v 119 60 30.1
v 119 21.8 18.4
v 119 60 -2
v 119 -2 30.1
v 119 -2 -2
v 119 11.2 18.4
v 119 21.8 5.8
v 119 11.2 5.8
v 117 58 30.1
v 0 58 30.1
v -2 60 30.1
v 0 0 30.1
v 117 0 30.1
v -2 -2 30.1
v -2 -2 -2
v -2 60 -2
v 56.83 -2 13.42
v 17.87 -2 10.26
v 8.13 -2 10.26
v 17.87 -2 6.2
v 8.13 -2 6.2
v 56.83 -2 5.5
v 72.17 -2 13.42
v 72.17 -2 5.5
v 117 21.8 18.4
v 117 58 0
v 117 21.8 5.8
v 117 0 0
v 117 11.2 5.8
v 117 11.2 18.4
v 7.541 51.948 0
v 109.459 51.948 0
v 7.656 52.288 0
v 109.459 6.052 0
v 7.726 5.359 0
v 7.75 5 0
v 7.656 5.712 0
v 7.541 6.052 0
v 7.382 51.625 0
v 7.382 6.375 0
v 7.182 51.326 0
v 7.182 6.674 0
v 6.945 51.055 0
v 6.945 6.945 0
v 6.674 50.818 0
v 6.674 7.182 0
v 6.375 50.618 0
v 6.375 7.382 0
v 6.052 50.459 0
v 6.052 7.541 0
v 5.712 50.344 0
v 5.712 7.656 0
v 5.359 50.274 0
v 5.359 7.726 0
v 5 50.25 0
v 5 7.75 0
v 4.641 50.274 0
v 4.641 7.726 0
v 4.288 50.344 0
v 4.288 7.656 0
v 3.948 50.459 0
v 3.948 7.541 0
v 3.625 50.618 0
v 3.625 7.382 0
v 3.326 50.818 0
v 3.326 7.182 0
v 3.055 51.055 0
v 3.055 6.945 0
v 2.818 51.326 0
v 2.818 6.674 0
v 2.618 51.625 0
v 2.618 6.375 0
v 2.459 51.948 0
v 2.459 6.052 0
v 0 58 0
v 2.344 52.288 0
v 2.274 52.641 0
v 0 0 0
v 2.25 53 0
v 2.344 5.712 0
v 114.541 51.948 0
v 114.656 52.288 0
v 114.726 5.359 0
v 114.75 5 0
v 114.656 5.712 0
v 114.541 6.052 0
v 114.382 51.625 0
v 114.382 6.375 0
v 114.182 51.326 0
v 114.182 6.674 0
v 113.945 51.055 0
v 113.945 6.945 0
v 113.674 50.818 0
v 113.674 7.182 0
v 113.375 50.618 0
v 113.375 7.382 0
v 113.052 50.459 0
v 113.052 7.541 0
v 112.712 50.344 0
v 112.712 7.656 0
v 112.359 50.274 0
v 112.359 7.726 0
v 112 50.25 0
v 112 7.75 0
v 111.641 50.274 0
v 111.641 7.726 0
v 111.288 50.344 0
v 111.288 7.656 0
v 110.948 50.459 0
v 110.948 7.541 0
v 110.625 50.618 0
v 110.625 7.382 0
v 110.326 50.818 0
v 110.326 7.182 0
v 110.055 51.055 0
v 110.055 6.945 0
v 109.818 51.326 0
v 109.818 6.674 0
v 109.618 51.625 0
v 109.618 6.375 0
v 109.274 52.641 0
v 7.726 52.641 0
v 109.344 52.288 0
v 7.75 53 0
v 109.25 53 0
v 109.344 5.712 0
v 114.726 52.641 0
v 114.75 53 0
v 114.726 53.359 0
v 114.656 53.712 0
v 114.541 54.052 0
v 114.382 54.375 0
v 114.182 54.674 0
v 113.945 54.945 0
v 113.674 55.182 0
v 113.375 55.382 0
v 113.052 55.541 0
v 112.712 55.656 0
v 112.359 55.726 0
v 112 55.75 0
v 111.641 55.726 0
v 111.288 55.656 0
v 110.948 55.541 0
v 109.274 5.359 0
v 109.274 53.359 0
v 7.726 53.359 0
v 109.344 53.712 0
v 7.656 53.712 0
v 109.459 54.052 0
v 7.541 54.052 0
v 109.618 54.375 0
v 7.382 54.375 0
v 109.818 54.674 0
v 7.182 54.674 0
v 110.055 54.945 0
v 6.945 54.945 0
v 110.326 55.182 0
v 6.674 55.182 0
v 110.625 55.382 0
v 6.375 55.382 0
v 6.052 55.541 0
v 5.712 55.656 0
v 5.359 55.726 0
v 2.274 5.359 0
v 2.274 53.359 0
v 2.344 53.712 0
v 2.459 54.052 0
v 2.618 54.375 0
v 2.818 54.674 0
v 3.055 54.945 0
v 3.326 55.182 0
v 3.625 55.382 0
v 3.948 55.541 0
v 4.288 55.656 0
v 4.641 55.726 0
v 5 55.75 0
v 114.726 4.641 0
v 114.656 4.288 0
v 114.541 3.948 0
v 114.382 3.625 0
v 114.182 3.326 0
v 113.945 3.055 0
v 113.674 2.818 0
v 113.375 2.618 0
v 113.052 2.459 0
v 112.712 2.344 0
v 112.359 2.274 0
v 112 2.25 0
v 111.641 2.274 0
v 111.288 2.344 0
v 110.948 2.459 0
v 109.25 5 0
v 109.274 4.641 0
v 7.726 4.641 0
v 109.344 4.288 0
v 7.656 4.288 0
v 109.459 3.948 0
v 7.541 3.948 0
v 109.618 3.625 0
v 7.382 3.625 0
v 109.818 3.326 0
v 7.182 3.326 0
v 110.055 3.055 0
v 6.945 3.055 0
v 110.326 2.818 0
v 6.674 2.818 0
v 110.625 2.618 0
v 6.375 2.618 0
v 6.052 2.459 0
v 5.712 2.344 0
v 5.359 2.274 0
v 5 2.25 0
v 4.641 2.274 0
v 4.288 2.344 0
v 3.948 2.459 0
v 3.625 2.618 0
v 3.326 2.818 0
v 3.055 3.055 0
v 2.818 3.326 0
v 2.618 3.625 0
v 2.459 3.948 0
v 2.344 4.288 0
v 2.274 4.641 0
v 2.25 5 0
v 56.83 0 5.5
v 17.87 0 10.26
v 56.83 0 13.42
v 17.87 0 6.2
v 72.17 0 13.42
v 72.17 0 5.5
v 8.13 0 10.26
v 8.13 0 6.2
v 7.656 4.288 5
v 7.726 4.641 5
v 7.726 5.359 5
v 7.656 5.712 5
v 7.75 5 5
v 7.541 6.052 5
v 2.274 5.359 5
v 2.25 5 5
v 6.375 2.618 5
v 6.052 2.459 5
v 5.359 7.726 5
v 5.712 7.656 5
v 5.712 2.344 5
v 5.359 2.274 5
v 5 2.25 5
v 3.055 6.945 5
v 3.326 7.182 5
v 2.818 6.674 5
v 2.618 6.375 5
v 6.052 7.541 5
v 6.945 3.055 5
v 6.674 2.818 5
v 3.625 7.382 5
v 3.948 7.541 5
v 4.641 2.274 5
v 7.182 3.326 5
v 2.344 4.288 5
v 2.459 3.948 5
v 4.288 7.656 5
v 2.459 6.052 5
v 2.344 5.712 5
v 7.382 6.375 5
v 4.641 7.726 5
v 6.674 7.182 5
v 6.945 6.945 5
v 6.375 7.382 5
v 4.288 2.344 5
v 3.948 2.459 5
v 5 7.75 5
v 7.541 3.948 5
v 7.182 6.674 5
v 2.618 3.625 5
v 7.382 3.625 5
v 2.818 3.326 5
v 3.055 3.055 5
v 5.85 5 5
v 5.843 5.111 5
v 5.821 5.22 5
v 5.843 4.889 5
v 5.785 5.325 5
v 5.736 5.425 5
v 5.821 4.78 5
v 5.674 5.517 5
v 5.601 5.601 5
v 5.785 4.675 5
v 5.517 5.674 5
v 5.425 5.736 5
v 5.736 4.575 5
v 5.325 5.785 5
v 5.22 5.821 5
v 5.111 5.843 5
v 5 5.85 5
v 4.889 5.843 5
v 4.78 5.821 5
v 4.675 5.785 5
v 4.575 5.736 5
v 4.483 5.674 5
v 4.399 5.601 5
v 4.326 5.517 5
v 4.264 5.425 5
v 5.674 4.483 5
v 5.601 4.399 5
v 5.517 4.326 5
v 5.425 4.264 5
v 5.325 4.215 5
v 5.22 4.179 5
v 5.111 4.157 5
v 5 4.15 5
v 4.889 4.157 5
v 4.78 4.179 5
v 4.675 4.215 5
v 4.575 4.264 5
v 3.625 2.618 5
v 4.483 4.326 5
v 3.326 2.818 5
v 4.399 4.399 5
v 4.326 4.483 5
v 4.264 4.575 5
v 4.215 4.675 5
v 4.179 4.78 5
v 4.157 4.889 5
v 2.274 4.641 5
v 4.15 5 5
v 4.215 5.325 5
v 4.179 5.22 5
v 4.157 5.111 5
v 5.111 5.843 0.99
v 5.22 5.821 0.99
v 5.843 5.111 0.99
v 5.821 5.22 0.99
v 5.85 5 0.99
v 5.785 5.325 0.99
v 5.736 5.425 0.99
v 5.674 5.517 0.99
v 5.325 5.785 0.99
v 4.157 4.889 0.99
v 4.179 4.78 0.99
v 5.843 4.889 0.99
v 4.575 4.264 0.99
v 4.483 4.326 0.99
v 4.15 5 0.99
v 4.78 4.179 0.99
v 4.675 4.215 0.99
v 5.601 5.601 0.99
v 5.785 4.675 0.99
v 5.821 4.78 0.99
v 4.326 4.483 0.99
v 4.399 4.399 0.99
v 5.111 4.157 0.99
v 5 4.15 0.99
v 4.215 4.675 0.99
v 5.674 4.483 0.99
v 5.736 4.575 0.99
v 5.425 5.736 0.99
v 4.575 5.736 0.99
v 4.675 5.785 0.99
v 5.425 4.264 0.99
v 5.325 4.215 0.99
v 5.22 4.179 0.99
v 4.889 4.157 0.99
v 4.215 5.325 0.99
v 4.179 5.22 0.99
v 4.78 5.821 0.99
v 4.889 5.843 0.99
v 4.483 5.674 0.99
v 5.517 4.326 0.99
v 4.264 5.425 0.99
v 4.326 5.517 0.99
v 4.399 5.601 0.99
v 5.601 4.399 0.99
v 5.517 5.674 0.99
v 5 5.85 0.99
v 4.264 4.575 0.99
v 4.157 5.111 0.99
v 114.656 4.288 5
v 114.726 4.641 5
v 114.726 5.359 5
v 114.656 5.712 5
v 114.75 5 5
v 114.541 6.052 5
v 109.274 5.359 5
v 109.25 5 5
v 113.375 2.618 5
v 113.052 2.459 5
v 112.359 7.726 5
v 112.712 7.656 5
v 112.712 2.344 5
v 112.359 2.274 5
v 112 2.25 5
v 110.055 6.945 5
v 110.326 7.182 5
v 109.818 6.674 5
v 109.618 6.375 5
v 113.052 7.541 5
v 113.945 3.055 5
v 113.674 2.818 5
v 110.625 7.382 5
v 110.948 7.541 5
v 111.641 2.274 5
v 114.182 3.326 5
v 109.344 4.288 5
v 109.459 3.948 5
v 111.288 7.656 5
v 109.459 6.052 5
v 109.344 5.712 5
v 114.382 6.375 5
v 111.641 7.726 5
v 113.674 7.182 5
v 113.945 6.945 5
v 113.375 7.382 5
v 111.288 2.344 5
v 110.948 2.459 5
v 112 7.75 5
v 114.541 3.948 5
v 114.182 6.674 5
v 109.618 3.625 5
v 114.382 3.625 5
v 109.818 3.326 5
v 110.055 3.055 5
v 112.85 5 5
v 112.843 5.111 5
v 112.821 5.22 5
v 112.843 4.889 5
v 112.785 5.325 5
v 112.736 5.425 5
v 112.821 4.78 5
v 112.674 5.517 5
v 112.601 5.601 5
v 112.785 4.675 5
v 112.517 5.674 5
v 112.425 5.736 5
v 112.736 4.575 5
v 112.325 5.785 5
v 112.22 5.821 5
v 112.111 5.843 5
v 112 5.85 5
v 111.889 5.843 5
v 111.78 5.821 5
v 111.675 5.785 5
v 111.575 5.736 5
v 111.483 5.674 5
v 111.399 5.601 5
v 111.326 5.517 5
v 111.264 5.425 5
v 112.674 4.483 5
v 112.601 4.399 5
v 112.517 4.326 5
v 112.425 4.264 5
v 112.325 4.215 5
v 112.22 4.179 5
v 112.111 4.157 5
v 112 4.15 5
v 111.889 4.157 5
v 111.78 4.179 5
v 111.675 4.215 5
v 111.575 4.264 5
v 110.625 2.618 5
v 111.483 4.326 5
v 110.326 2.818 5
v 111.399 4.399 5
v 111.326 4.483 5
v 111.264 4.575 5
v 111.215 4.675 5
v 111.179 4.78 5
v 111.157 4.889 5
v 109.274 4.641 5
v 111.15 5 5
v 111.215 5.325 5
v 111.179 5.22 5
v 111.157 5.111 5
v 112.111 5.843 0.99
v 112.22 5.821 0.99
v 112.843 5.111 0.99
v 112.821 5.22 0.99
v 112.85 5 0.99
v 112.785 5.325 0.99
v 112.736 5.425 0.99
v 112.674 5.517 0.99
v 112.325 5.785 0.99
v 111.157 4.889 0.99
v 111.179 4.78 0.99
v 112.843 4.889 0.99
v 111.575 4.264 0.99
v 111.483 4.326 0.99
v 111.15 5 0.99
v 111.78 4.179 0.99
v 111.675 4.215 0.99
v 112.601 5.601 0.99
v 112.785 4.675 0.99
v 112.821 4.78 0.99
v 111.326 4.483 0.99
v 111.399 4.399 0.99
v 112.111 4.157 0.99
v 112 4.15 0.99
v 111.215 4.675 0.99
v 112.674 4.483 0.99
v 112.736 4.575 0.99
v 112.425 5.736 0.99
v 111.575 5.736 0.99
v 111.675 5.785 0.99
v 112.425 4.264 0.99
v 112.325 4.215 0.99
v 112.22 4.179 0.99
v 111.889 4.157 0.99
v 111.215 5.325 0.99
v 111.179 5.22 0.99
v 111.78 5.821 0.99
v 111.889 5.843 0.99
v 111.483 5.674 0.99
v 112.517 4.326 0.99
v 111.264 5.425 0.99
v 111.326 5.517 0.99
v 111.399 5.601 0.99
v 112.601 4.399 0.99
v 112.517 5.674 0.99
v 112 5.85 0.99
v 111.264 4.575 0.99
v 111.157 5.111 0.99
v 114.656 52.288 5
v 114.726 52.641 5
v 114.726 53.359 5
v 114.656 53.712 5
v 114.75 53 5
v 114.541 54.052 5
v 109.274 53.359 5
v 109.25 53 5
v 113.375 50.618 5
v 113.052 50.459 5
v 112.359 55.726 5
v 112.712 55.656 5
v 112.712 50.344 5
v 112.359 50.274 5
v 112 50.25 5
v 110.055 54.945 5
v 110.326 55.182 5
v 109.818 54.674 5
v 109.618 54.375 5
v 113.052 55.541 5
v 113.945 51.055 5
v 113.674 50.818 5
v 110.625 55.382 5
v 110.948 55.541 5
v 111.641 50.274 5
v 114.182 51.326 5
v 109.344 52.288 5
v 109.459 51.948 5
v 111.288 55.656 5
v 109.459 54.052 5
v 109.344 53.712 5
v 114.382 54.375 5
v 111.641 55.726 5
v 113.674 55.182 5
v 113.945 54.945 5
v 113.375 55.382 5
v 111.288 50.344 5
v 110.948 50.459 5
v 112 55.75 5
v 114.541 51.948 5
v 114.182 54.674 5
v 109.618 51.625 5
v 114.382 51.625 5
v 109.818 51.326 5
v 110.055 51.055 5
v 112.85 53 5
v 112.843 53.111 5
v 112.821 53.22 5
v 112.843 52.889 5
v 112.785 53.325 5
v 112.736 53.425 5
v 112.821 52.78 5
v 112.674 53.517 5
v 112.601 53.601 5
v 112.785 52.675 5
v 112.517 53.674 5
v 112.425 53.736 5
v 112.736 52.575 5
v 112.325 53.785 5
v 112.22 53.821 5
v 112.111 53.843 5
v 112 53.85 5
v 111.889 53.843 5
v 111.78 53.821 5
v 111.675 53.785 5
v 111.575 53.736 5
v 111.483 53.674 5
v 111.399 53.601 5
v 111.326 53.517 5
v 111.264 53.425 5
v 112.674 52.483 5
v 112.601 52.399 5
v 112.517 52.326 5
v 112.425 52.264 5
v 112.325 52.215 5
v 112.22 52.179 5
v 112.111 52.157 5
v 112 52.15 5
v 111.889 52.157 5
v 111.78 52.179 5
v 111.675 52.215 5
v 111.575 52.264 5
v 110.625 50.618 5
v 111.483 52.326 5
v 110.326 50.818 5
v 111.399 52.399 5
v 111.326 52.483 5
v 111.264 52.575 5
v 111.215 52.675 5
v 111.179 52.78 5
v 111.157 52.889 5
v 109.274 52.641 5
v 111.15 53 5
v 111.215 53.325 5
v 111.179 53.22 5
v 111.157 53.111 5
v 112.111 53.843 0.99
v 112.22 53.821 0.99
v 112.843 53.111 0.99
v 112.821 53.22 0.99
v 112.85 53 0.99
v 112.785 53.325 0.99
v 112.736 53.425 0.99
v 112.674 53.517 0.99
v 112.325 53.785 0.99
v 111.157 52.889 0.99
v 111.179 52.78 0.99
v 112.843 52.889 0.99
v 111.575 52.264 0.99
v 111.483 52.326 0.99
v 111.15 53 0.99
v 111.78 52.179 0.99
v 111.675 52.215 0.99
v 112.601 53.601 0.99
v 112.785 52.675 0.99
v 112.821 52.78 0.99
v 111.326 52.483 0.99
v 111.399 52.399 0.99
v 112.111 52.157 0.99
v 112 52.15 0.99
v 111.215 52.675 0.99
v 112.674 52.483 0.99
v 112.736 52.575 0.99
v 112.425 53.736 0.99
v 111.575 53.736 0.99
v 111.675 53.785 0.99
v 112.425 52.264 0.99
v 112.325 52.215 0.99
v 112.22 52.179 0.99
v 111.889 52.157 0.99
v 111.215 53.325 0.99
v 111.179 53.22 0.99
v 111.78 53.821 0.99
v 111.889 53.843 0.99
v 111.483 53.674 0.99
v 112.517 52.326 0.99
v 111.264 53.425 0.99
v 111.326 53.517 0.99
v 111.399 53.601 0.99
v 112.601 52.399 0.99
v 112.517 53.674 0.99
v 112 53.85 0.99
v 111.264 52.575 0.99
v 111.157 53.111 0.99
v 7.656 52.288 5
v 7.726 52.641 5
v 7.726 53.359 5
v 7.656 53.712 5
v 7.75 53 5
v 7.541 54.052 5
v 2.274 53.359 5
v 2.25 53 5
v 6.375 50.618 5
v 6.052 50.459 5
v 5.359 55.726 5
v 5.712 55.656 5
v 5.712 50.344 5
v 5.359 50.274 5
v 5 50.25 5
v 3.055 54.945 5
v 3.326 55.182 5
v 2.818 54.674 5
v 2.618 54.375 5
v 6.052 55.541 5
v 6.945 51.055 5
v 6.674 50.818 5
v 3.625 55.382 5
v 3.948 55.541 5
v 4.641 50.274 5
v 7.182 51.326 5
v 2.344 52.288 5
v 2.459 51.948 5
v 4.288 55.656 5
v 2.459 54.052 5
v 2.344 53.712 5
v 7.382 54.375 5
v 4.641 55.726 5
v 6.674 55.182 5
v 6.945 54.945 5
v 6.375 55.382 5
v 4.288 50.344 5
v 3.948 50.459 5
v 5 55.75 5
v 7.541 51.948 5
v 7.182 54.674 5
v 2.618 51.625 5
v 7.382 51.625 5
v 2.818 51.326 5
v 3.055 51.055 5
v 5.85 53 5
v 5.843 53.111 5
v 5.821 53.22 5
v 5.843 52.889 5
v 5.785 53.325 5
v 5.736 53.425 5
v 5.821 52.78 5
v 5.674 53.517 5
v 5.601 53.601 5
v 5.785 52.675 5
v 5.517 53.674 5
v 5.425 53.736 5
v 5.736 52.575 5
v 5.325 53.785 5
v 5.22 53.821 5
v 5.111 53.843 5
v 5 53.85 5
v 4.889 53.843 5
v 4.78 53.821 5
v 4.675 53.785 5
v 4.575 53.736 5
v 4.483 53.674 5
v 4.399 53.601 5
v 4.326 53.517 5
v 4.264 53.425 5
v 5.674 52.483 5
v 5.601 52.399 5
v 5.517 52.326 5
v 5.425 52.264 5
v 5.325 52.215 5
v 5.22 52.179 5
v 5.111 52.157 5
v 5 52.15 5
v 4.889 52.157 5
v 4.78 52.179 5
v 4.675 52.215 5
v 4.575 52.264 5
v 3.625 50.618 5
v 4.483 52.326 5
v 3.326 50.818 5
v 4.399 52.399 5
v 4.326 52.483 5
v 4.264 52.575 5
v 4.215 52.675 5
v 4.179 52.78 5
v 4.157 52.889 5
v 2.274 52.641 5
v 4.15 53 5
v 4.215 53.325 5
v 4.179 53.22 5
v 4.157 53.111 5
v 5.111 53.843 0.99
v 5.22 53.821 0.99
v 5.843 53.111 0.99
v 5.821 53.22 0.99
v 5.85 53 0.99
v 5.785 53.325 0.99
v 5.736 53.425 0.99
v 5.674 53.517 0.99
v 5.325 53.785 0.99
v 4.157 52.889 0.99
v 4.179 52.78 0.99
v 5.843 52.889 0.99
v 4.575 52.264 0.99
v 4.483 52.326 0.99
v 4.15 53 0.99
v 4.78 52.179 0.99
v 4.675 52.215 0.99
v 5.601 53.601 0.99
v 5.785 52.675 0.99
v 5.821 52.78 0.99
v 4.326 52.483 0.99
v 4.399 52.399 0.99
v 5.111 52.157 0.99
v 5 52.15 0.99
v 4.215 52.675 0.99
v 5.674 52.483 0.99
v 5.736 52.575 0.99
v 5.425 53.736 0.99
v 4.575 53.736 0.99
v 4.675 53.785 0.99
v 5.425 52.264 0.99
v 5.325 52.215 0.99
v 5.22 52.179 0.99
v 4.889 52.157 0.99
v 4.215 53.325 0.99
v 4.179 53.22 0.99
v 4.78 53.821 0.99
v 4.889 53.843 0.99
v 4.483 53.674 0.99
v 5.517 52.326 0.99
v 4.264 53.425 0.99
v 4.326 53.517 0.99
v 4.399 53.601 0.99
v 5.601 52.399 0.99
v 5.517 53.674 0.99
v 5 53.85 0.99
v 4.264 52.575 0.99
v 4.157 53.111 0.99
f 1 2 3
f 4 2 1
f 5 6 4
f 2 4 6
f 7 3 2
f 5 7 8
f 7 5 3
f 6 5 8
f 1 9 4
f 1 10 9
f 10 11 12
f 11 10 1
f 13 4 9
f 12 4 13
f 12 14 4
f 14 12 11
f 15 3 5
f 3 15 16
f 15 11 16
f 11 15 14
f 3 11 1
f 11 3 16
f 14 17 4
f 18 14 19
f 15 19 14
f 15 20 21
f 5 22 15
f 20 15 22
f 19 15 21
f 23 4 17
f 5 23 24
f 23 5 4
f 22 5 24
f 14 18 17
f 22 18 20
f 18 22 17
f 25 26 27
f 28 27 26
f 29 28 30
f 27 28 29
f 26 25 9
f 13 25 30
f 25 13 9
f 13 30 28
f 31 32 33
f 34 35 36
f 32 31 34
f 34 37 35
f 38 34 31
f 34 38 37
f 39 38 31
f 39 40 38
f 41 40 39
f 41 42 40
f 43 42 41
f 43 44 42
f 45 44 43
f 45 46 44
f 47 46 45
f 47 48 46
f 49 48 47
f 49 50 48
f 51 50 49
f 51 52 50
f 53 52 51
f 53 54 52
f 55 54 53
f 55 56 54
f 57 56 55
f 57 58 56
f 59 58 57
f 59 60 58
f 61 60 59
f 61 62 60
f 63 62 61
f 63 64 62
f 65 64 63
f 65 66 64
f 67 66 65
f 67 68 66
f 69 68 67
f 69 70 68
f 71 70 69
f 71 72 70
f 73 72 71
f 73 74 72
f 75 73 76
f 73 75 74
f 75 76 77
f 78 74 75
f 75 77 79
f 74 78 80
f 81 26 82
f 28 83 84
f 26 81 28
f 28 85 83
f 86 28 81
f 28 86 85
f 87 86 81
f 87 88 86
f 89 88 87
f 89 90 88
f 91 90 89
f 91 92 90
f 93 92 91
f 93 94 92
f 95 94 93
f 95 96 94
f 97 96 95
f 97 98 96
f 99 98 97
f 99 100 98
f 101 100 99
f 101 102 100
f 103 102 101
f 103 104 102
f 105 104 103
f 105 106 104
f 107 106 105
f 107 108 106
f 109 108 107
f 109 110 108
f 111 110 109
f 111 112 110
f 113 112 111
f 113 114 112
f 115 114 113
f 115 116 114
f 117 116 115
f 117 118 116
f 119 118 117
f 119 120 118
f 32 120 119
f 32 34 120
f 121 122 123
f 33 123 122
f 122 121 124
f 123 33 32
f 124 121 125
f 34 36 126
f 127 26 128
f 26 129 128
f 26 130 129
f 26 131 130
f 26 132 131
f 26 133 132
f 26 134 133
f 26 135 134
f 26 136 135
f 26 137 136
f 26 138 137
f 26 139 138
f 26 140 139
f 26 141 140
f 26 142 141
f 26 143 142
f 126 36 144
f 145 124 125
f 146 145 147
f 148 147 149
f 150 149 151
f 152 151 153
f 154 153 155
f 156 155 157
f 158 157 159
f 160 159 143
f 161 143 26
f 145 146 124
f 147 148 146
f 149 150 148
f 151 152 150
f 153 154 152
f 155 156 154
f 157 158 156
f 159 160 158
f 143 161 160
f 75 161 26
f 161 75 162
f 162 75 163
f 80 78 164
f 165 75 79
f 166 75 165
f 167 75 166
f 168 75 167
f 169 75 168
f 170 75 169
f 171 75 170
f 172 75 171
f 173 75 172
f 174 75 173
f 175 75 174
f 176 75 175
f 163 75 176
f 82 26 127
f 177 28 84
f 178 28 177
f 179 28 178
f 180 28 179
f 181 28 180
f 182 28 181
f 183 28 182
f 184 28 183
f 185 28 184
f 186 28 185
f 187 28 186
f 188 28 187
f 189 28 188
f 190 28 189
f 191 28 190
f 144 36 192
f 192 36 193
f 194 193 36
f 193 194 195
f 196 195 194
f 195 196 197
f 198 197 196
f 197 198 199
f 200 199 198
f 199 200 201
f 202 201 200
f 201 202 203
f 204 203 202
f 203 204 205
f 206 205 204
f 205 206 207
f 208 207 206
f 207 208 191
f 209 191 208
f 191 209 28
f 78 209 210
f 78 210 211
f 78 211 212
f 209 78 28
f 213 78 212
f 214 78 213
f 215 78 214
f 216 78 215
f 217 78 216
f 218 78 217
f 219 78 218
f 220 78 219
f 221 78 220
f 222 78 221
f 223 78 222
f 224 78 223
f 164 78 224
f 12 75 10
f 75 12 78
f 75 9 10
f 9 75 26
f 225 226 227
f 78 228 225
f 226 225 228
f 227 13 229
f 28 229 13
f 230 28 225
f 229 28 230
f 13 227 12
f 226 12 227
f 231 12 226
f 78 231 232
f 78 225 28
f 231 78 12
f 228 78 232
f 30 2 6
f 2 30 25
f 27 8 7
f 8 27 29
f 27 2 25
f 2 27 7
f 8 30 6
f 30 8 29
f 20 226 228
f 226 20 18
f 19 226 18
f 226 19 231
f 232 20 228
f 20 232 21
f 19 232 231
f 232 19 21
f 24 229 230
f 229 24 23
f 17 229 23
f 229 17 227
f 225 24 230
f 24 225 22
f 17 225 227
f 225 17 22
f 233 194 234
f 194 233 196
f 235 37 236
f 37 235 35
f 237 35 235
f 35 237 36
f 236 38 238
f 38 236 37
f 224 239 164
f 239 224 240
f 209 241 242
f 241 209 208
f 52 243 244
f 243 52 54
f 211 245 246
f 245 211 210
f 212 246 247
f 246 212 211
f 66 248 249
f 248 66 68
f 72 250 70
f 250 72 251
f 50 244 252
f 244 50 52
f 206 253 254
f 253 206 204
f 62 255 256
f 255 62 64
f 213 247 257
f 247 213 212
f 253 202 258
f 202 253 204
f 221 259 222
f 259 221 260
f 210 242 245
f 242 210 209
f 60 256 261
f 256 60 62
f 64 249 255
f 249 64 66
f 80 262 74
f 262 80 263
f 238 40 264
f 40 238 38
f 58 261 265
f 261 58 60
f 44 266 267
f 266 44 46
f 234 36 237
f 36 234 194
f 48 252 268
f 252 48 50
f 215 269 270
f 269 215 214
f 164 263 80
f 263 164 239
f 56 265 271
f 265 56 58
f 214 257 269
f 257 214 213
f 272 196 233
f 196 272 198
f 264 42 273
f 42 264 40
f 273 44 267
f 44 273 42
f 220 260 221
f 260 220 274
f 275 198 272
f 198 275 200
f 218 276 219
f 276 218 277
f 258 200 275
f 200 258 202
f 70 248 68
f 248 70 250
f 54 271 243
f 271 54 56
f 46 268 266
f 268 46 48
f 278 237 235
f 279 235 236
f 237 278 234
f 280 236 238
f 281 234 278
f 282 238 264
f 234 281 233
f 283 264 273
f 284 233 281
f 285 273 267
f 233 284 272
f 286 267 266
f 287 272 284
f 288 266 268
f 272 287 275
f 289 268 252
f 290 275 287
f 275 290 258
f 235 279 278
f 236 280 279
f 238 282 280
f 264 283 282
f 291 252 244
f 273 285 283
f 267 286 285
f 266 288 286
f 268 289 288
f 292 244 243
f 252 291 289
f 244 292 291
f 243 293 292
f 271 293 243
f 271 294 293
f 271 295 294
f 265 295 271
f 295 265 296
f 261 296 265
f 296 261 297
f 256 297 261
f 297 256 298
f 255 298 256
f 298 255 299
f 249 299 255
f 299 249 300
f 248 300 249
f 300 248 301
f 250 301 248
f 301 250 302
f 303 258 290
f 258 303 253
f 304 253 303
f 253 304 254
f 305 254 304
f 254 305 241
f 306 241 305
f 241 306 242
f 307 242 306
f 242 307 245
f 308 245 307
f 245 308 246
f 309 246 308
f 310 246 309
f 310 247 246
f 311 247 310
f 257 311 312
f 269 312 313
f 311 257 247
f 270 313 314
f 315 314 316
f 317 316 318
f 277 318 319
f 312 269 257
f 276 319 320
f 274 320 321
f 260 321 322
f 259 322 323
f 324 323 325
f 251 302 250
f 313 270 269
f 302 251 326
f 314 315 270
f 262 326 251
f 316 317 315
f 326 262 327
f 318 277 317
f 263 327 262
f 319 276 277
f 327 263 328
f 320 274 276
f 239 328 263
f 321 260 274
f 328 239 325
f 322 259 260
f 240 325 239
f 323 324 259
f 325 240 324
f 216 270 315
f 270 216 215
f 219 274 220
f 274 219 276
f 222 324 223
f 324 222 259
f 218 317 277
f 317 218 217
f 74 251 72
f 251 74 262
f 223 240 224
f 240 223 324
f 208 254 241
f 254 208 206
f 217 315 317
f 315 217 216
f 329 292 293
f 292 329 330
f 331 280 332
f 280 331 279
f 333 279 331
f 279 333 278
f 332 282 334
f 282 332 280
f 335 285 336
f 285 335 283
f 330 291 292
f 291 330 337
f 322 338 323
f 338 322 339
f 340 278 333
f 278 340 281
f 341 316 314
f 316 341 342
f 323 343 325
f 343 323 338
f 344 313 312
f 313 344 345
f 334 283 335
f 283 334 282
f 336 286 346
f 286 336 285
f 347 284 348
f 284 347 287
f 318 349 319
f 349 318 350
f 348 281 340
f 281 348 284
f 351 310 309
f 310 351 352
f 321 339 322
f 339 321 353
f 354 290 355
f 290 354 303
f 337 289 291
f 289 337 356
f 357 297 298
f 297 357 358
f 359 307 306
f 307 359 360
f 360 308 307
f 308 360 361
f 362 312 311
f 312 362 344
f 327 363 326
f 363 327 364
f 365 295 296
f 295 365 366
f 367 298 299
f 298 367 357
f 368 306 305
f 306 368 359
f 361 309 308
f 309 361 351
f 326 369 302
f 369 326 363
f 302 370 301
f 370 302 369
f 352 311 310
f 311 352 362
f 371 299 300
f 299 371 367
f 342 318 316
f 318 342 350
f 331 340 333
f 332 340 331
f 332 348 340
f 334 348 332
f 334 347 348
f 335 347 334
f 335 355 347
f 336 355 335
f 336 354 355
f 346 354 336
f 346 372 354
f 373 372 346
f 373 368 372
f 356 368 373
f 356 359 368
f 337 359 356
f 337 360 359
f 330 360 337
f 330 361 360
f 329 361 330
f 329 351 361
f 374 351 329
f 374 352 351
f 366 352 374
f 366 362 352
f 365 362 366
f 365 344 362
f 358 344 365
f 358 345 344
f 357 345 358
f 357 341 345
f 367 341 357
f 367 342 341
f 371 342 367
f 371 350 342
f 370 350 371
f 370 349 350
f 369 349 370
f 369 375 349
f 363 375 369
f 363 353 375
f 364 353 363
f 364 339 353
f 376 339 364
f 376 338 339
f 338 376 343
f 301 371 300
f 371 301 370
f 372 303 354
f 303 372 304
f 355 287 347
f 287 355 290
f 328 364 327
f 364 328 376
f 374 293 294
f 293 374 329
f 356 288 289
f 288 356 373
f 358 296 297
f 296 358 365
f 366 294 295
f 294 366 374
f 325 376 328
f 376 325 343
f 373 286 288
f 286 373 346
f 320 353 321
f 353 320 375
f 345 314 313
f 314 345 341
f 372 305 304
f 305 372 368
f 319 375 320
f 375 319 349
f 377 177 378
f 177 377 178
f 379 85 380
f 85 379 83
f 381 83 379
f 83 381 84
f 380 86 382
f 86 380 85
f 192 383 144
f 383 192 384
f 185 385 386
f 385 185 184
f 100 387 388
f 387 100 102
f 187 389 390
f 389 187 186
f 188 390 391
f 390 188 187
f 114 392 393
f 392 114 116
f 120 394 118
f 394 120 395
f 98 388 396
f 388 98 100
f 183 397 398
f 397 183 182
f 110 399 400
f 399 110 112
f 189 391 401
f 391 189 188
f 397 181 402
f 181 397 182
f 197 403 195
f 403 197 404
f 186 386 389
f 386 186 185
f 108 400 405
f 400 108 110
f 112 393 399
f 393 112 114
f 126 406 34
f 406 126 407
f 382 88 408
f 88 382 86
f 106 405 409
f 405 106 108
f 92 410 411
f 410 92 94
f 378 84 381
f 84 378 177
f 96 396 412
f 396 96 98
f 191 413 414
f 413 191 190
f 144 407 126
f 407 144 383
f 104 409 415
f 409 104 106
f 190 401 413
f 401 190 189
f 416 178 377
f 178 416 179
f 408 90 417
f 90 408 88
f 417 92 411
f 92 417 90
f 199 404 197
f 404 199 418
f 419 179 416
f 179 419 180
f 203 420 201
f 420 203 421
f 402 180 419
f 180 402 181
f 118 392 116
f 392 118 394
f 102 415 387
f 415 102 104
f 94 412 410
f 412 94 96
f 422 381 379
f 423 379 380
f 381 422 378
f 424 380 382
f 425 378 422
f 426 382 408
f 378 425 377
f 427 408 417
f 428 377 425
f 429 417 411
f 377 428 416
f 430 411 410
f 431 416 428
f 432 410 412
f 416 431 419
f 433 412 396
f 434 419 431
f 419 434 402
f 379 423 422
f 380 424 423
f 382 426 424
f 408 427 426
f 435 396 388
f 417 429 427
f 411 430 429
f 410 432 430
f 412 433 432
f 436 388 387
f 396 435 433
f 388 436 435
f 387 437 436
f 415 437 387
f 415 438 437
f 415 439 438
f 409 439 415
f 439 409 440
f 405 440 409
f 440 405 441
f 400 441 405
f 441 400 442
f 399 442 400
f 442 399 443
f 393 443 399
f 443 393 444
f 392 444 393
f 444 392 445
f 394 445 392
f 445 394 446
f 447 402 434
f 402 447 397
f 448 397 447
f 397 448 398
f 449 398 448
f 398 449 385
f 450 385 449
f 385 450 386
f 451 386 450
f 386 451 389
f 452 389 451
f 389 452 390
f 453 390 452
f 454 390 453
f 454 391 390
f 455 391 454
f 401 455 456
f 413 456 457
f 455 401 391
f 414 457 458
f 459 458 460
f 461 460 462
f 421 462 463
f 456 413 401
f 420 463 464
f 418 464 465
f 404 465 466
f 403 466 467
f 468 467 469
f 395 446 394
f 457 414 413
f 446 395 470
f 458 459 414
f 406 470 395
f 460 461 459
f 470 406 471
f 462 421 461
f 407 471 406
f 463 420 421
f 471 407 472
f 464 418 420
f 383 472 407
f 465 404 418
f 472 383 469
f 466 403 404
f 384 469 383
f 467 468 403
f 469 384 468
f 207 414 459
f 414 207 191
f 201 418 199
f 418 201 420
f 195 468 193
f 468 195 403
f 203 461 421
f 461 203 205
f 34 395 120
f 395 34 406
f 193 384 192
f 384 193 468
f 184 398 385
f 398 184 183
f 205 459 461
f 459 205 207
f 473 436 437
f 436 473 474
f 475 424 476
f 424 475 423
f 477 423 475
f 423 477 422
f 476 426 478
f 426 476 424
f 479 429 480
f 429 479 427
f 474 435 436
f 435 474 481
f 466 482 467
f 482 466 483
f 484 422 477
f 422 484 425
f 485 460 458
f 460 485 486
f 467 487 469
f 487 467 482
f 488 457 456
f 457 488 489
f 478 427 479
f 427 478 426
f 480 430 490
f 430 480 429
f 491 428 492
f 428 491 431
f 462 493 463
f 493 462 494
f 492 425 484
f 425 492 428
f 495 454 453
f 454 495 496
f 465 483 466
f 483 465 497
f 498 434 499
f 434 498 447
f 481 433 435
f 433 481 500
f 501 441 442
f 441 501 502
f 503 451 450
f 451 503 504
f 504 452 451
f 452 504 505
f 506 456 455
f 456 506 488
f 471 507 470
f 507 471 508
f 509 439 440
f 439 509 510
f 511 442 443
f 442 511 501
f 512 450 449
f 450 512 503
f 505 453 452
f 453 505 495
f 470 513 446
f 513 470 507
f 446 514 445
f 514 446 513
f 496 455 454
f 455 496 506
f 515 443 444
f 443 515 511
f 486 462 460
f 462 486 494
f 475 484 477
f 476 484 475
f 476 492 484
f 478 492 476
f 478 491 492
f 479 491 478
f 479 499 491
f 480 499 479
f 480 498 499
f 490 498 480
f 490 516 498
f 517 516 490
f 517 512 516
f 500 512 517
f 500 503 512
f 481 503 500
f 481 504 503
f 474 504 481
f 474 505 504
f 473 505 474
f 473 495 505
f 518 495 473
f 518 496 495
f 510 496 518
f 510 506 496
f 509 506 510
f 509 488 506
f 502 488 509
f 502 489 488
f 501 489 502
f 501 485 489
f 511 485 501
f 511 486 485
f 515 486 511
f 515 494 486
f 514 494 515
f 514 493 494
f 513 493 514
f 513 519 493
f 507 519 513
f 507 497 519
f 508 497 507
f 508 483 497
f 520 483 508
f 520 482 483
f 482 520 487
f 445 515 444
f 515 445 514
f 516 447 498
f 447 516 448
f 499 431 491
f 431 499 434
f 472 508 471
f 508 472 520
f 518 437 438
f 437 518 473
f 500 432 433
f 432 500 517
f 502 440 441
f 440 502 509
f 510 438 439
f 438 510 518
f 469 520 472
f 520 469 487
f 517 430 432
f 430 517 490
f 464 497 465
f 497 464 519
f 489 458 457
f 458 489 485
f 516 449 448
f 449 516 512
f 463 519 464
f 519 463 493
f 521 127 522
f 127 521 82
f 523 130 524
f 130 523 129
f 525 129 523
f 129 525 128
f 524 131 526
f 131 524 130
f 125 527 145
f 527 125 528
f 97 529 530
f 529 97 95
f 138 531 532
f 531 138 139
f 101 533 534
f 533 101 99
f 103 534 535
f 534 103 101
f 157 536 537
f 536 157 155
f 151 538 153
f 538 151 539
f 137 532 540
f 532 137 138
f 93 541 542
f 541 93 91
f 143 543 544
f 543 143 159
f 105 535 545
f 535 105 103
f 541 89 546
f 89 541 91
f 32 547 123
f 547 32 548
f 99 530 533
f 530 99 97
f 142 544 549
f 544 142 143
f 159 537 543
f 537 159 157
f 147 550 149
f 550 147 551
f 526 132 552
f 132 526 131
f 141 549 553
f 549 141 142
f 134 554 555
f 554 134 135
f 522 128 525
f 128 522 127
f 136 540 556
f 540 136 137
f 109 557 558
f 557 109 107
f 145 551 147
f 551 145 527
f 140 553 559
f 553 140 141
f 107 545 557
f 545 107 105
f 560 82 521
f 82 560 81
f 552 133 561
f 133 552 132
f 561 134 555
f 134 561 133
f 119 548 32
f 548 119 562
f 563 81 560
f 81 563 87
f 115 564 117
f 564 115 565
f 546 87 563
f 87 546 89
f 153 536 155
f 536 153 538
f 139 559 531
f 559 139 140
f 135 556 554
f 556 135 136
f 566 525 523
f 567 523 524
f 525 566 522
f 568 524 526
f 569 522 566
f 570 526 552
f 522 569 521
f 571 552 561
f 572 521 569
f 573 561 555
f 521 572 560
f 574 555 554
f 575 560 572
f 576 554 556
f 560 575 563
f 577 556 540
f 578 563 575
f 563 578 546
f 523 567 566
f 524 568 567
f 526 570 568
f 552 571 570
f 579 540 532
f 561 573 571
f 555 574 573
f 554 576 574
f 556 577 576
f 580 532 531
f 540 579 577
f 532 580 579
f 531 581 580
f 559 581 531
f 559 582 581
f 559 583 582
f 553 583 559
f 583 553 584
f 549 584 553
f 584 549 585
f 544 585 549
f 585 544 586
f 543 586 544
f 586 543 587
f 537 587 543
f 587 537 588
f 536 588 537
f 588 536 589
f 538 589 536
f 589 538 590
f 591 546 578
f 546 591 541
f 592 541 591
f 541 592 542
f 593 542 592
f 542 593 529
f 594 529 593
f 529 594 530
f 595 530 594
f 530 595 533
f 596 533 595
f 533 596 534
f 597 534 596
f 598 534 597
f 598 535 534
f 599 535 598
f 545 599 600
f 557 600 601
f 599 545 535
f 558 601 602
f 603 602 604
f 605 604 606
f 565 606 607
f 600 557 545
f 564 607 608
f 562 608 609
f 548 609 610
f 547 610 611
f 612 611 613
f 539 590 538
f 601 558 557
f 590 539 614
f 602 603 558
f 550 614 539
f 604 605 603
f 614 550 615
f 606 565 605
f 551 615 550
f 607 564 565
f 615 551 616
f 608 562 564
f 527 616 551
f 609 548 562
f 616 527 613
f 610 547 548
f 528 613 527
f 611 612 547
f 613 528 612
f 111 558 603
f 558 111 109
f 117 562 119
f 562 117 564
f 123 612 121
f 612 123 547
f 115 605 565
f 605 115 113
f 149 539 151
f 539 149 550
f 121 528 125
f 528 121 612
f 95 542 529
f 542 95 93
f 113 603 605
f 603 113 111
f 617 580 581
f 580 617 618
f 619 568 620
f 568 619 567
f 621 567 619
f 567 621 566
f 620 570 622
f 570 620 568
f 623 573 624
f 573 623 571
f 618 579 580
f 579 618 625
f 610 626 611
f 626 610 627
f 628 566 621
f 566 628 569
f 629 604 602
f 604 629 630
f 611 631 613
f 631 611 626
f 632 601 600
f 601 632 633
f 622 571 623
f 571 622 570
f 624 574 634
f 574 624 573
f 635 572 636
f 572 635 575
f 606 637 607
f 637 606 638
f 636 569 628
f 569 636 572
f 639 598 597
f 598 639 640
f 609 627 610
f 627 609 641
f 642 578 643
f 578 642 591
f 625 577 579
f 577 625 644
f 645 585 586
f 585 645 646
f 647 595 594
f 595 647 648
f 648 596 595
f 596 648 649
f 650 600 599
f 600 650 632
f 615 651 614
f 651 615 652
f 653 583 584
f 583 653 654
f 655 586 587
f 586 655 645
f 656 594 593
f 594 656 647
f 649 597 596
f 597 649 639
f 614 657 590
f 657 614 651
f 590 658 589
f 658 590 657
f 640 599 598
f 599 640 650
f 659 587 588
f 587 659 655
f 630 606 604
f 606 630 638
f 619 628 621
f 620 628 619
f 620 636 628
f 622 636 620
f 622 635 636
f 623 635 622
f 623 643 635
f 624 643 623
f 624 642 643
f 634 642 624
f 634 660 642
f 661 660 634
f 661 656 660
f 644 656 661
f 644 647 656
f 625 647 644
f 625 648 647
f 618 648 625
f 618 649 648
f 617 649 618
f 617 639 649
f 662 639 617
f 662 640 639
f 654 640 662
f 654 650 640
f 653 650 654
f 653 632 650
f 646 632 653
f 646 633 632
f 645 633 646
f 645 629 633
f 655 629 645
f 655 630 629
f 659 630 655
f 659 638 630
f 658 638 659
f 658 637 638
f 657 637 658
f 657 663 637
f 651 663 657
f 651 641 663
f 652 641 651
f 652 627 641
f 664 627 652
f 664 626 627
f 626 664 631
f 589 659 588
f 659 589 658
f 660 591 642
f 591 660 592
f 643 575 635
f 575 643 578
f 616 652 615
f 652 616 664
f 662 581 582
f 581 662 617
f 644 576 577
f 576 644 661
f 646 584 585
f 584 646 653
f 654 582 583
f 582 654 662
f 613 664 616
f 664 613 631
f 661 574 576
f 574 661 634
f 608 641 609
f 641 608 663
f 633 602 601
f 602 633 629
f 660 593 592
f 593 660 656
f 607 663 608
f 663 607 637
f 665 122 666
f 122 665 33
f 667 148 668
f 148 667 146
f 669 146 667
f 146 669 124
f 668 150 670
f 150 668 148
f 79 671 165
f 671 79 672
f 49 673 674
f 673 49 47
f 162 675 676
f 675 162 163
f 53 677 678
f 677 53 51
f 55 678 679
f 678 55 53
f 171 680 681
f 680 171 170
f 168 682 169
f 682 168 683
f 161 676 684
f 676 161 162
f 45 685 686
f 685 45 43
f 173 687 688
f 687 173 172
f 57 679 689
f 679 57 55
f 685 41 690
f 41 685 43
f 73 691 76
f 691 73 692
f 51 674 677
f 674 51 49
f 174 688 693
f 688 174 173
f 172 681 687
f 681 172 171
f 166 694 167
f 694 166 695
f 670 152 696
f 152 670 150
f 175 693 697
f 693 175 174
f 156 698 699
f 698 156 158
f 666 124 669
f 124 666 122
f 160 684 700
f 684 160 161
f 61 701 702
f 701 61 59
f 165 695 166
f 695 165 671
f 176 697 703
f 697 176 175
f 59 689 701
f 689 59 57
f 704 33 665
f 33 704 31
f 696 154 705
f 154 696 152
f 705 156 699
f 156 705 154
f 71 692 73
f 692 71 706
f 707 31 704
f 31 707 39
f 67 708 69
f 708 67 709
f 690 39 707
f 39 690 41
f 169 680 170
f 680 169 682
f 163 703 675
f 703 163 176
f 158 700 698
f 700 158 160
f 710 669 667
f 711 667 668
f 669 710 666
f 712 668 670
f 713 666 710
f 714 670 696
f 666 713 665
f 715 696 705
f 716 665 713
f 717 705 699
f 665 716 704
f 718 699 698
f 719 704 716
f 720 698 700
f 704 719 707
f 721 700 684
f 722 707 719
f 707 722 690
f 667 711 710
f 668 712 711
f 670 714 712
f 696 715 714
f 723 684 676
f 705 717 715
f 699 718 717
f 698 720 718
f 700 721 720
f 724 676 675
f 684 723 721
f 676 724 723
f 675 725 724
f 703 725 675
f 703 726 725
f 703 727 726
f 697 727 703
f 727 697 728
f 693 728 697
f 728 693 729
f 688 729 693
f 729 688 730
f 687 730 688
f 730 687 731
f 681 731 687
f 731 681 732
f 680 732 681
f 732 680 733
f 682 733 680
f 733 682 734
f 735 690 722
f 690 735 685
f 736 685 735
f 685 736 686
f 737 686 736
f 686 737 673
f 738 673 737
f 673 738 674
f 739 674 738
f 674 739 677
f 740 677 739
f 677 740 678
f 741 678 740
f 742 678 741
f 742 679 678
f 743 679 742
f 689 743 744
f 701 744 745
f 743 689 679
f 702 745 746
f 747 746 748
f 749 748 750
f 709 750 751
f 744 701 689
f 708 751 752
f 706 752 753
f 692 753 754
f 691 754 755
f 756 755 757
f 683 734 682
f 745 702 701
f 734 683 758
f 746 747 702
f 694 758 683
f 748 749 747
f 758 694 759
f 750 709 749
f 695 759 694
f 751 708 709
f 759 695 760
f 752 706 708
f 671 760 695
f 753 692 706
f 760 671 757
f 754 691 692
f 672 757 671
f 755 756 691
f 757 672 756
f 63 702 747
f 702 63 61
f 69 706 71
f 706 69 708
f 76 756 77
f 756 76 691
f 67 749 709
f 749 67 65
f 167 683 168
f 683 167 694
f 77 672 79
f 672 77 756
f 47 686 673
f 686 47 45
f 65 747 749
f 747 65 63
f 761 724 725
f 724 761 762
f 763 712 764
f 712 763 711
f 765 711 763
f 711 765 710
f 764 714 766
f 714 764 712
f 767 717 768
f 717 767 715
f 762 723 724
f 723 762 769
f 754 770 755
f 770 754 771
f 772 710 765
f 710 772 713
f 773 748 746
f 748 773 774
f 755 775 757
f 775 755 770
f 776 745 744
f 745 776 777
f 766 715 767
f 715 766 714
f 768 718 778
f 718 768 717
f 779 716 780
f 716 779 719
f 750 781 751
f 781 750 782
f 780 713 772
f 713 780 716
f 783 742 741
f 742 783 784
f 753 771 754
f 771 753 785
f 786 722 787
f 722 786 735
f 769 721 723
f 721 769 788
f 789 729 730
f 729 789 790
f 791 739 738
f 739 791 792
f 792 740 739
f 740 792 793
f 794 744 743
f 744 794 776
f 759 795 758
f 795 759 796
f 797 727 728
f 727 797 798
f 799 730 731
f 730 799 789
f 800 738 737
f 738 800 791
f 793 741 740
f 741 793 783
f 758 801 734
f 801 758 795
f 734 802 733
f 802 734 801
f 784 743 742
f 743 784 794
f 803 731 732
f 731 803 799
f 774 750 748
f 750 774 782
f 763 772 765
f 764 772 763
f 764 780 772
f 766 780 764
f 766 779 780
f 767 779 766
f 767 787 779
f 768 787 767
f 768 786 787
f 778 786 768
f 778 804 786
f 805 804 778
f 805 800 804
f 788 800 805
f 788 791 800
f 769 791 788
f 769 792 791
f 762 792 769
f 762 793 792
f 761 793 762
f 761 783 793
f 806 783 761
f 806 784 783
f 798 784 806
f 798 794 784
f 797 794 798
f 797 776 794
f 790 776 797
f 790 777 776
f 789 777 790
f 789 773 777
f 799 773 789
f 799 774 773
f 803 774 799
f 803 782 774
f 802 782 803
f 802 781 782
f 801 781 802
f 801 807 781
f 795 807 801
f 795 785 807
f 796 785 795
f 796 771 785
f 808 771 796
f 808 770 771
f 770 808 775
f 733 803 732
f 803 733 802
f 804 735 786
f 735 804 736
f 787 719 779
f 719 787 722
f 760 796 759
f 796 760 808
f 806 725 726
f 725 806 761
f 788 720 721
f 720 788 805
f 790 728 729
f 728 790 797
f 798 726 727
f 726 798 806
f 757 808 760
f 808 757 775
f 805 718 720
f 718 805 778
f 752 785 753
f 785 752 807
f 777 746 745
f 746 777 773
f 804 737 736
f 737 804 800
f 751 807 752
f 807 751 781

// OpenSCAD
// REV enclosure -- AI-01 Audio Interface
// Board rev B (114.00 x 55.00 mm). Units: mm.
// Coordinates: origin = inside floor, bottom-left corner of the cavity; x right, y back, z up.
//
// Edit and save -- REV captures every change.
// Each saved change is diffed, turned into engineering actions, verified, and recorded in GBrain.

// === PARAMETERS (edit these) ===
wall = 2.00;              // wall + floor thickness
standoff_h = 5.00;        // PCB sits on top of the standoffs
cavity_w = 117.00;          // inside width  (x)
cavity_d = 58.00;          // inside depth  (y)
cavity_h = 30.10;          // inside height (z, open top)
board_origin_x = 1.50;     // PCB bottom-left corner in the cavity
board_origin_y = 1.50;

// standoff under mounting hole H1
standoff_H1_x = 5.00;
standoff_H1_y = 5.00;
standoff_H1_dia = 5.50;
standoff_H1_bore = 1.70;

// standoff under mounting hole H2
standoff_H2_x = 112.00;
standoff_H2_y = 5.00;
standoff_H2_dia = 5.50;
standoff_H2_bore = 1.70;

// standoff under mounting hole H3
standoff_H3_x = 112.00;
standoff_H3_y = 53.00;
standoff_H3_dia = 5.50;
standoff_H3_bore = 1.70;

// standoff under mounting hole H4
standoff_H4_x = 5.00;
standoff_H4_y = 53.00;
standoff_H4_dia = 5.50;
standoff_H4_bore = 1.70;

// right wall cut-out for J1 barrel (connector body 9.00 x 11.00); pos = along the wall, z = centre height
opening_J1_barrel_pos = 16.50;
opening_J1_barrel_z = 12.10;
opening_J1_barrel_w = 10.60;
opening_J1_barrel_h = 12.60;

// front wall cut-out for J2 usb_c (connector body 8.94 x 3.26); pos = along the wall, z = centre height
opening_J2_usb_c_pos = 13.00;
opening_J2_usb_c_z = 8.23;
opening_J2_usb_c_w = 9.74;
opening_J2_usb_c_h = 4.06;

// front wall cut-out for J3 usb_a (connector body 13.14 x 5.72); pos = along the wall, z = centre height
opening_J3_usb_a_pos = 64.50;
opening_J3_usb_a_z = 9.46;
opening_J3_usb_a_w = 15.34;
opening_J3_usb_a_h = 7.92;
// === END PARAMETERS ===

// --- PCB reference (read-only, from the board design; drawn with % so it is not part of the part) ---
board_w = 114.00;
board_d = 55.00;
board_t = 1.60;
board_max_component_h = 20.50;

$fn = 48;

module cutout(side, pos, z, w, h) {
    if (side == "front") translate([pos - w/2, -wall - 1, z - h/2]) cube([w, wall + 2, h]);
    if (side == "back")  translate([pos - w/2, cavity_d - 1, z - h/2]) cube([w, wall + 2, h]);
    if (side == "left")  translate([-wall - 1, pos - w/2, z - h/2]) cube([wall + 2, w, h]);
    if (side == "right") translate([cavity_w - 1, pos - w/2, z - h/2]) cube([wall + 2, w, h]);
}

module standoff(x, y, dia, bore) {
    translate([x, y, -0.01]) difference() {
        cylinder(h = standoff_h + 0.01, d = dia);
        translate([0, 0, 1]) cylinder(h = standoff_h + 1, d = bore);
    }
}

module shell() {
    difference() {
        translate([-wall, -wall, -wall]) cube([cavity_w + 2*wall, cavity_d + 2*wall, cavity_h + wall]);
        cube([cavity_w, cavity_d, cavity_h + 1]);   // cavity, open top
        cutout("right", opening_J1_barrel_pos, opening_J1_barrel_z, opening_J1_barrel_w, opening_J1_barrel_h);
        cutout("front", opening_J2_usb_c_pos, opening_J2_usb_c_z, opening_J2_usb_c_w, opening_J2_usb_c_h);
        cutout("front", opening_J3_usb_a_pos, opening_J3_usb_a_z, opening_J3_usb_a_w, opening_J3_usb_a_h);
    }
}

module enclosure() {
    union() {
        shell();
        standoff(standoff_H1_x, standoff_H1_y, standoff_H1_dia, standoff_H1_bore);
        standoff(standoff_H2_x, standoff_H2_y, standoff_H2_dia, standoff_H2_bore);
        standoff(standoff_H3_x, standoff_H3_y, standoff_H3_dia, standoff_H3_bore);
        standoff(standoff_H4_x, standoff_H4_y, standoff_H4_dia, standoff_H4_bore);
    }
}

module pcb() {
    translate([board_origin_x, board_origin_y, standoff_h]) {
        cube([board_w, board_d, board_t]);
        translate([board_w - 7, 15.00 - 9.00/2, 1.60]) cube([8, 9.00, 11.00]);   // J1 barrel
        translate([11.50 - 8.94/2, -1, 1.60]) cube([8.94, 8, 3.26]);   // J2 usb_c
        translate([63.00 - 13.14/2, -1, 1.60]) cube([13.14, 8, 5.72]);   // J3 usb_a
    }
}

enclosure();
%pcb();
